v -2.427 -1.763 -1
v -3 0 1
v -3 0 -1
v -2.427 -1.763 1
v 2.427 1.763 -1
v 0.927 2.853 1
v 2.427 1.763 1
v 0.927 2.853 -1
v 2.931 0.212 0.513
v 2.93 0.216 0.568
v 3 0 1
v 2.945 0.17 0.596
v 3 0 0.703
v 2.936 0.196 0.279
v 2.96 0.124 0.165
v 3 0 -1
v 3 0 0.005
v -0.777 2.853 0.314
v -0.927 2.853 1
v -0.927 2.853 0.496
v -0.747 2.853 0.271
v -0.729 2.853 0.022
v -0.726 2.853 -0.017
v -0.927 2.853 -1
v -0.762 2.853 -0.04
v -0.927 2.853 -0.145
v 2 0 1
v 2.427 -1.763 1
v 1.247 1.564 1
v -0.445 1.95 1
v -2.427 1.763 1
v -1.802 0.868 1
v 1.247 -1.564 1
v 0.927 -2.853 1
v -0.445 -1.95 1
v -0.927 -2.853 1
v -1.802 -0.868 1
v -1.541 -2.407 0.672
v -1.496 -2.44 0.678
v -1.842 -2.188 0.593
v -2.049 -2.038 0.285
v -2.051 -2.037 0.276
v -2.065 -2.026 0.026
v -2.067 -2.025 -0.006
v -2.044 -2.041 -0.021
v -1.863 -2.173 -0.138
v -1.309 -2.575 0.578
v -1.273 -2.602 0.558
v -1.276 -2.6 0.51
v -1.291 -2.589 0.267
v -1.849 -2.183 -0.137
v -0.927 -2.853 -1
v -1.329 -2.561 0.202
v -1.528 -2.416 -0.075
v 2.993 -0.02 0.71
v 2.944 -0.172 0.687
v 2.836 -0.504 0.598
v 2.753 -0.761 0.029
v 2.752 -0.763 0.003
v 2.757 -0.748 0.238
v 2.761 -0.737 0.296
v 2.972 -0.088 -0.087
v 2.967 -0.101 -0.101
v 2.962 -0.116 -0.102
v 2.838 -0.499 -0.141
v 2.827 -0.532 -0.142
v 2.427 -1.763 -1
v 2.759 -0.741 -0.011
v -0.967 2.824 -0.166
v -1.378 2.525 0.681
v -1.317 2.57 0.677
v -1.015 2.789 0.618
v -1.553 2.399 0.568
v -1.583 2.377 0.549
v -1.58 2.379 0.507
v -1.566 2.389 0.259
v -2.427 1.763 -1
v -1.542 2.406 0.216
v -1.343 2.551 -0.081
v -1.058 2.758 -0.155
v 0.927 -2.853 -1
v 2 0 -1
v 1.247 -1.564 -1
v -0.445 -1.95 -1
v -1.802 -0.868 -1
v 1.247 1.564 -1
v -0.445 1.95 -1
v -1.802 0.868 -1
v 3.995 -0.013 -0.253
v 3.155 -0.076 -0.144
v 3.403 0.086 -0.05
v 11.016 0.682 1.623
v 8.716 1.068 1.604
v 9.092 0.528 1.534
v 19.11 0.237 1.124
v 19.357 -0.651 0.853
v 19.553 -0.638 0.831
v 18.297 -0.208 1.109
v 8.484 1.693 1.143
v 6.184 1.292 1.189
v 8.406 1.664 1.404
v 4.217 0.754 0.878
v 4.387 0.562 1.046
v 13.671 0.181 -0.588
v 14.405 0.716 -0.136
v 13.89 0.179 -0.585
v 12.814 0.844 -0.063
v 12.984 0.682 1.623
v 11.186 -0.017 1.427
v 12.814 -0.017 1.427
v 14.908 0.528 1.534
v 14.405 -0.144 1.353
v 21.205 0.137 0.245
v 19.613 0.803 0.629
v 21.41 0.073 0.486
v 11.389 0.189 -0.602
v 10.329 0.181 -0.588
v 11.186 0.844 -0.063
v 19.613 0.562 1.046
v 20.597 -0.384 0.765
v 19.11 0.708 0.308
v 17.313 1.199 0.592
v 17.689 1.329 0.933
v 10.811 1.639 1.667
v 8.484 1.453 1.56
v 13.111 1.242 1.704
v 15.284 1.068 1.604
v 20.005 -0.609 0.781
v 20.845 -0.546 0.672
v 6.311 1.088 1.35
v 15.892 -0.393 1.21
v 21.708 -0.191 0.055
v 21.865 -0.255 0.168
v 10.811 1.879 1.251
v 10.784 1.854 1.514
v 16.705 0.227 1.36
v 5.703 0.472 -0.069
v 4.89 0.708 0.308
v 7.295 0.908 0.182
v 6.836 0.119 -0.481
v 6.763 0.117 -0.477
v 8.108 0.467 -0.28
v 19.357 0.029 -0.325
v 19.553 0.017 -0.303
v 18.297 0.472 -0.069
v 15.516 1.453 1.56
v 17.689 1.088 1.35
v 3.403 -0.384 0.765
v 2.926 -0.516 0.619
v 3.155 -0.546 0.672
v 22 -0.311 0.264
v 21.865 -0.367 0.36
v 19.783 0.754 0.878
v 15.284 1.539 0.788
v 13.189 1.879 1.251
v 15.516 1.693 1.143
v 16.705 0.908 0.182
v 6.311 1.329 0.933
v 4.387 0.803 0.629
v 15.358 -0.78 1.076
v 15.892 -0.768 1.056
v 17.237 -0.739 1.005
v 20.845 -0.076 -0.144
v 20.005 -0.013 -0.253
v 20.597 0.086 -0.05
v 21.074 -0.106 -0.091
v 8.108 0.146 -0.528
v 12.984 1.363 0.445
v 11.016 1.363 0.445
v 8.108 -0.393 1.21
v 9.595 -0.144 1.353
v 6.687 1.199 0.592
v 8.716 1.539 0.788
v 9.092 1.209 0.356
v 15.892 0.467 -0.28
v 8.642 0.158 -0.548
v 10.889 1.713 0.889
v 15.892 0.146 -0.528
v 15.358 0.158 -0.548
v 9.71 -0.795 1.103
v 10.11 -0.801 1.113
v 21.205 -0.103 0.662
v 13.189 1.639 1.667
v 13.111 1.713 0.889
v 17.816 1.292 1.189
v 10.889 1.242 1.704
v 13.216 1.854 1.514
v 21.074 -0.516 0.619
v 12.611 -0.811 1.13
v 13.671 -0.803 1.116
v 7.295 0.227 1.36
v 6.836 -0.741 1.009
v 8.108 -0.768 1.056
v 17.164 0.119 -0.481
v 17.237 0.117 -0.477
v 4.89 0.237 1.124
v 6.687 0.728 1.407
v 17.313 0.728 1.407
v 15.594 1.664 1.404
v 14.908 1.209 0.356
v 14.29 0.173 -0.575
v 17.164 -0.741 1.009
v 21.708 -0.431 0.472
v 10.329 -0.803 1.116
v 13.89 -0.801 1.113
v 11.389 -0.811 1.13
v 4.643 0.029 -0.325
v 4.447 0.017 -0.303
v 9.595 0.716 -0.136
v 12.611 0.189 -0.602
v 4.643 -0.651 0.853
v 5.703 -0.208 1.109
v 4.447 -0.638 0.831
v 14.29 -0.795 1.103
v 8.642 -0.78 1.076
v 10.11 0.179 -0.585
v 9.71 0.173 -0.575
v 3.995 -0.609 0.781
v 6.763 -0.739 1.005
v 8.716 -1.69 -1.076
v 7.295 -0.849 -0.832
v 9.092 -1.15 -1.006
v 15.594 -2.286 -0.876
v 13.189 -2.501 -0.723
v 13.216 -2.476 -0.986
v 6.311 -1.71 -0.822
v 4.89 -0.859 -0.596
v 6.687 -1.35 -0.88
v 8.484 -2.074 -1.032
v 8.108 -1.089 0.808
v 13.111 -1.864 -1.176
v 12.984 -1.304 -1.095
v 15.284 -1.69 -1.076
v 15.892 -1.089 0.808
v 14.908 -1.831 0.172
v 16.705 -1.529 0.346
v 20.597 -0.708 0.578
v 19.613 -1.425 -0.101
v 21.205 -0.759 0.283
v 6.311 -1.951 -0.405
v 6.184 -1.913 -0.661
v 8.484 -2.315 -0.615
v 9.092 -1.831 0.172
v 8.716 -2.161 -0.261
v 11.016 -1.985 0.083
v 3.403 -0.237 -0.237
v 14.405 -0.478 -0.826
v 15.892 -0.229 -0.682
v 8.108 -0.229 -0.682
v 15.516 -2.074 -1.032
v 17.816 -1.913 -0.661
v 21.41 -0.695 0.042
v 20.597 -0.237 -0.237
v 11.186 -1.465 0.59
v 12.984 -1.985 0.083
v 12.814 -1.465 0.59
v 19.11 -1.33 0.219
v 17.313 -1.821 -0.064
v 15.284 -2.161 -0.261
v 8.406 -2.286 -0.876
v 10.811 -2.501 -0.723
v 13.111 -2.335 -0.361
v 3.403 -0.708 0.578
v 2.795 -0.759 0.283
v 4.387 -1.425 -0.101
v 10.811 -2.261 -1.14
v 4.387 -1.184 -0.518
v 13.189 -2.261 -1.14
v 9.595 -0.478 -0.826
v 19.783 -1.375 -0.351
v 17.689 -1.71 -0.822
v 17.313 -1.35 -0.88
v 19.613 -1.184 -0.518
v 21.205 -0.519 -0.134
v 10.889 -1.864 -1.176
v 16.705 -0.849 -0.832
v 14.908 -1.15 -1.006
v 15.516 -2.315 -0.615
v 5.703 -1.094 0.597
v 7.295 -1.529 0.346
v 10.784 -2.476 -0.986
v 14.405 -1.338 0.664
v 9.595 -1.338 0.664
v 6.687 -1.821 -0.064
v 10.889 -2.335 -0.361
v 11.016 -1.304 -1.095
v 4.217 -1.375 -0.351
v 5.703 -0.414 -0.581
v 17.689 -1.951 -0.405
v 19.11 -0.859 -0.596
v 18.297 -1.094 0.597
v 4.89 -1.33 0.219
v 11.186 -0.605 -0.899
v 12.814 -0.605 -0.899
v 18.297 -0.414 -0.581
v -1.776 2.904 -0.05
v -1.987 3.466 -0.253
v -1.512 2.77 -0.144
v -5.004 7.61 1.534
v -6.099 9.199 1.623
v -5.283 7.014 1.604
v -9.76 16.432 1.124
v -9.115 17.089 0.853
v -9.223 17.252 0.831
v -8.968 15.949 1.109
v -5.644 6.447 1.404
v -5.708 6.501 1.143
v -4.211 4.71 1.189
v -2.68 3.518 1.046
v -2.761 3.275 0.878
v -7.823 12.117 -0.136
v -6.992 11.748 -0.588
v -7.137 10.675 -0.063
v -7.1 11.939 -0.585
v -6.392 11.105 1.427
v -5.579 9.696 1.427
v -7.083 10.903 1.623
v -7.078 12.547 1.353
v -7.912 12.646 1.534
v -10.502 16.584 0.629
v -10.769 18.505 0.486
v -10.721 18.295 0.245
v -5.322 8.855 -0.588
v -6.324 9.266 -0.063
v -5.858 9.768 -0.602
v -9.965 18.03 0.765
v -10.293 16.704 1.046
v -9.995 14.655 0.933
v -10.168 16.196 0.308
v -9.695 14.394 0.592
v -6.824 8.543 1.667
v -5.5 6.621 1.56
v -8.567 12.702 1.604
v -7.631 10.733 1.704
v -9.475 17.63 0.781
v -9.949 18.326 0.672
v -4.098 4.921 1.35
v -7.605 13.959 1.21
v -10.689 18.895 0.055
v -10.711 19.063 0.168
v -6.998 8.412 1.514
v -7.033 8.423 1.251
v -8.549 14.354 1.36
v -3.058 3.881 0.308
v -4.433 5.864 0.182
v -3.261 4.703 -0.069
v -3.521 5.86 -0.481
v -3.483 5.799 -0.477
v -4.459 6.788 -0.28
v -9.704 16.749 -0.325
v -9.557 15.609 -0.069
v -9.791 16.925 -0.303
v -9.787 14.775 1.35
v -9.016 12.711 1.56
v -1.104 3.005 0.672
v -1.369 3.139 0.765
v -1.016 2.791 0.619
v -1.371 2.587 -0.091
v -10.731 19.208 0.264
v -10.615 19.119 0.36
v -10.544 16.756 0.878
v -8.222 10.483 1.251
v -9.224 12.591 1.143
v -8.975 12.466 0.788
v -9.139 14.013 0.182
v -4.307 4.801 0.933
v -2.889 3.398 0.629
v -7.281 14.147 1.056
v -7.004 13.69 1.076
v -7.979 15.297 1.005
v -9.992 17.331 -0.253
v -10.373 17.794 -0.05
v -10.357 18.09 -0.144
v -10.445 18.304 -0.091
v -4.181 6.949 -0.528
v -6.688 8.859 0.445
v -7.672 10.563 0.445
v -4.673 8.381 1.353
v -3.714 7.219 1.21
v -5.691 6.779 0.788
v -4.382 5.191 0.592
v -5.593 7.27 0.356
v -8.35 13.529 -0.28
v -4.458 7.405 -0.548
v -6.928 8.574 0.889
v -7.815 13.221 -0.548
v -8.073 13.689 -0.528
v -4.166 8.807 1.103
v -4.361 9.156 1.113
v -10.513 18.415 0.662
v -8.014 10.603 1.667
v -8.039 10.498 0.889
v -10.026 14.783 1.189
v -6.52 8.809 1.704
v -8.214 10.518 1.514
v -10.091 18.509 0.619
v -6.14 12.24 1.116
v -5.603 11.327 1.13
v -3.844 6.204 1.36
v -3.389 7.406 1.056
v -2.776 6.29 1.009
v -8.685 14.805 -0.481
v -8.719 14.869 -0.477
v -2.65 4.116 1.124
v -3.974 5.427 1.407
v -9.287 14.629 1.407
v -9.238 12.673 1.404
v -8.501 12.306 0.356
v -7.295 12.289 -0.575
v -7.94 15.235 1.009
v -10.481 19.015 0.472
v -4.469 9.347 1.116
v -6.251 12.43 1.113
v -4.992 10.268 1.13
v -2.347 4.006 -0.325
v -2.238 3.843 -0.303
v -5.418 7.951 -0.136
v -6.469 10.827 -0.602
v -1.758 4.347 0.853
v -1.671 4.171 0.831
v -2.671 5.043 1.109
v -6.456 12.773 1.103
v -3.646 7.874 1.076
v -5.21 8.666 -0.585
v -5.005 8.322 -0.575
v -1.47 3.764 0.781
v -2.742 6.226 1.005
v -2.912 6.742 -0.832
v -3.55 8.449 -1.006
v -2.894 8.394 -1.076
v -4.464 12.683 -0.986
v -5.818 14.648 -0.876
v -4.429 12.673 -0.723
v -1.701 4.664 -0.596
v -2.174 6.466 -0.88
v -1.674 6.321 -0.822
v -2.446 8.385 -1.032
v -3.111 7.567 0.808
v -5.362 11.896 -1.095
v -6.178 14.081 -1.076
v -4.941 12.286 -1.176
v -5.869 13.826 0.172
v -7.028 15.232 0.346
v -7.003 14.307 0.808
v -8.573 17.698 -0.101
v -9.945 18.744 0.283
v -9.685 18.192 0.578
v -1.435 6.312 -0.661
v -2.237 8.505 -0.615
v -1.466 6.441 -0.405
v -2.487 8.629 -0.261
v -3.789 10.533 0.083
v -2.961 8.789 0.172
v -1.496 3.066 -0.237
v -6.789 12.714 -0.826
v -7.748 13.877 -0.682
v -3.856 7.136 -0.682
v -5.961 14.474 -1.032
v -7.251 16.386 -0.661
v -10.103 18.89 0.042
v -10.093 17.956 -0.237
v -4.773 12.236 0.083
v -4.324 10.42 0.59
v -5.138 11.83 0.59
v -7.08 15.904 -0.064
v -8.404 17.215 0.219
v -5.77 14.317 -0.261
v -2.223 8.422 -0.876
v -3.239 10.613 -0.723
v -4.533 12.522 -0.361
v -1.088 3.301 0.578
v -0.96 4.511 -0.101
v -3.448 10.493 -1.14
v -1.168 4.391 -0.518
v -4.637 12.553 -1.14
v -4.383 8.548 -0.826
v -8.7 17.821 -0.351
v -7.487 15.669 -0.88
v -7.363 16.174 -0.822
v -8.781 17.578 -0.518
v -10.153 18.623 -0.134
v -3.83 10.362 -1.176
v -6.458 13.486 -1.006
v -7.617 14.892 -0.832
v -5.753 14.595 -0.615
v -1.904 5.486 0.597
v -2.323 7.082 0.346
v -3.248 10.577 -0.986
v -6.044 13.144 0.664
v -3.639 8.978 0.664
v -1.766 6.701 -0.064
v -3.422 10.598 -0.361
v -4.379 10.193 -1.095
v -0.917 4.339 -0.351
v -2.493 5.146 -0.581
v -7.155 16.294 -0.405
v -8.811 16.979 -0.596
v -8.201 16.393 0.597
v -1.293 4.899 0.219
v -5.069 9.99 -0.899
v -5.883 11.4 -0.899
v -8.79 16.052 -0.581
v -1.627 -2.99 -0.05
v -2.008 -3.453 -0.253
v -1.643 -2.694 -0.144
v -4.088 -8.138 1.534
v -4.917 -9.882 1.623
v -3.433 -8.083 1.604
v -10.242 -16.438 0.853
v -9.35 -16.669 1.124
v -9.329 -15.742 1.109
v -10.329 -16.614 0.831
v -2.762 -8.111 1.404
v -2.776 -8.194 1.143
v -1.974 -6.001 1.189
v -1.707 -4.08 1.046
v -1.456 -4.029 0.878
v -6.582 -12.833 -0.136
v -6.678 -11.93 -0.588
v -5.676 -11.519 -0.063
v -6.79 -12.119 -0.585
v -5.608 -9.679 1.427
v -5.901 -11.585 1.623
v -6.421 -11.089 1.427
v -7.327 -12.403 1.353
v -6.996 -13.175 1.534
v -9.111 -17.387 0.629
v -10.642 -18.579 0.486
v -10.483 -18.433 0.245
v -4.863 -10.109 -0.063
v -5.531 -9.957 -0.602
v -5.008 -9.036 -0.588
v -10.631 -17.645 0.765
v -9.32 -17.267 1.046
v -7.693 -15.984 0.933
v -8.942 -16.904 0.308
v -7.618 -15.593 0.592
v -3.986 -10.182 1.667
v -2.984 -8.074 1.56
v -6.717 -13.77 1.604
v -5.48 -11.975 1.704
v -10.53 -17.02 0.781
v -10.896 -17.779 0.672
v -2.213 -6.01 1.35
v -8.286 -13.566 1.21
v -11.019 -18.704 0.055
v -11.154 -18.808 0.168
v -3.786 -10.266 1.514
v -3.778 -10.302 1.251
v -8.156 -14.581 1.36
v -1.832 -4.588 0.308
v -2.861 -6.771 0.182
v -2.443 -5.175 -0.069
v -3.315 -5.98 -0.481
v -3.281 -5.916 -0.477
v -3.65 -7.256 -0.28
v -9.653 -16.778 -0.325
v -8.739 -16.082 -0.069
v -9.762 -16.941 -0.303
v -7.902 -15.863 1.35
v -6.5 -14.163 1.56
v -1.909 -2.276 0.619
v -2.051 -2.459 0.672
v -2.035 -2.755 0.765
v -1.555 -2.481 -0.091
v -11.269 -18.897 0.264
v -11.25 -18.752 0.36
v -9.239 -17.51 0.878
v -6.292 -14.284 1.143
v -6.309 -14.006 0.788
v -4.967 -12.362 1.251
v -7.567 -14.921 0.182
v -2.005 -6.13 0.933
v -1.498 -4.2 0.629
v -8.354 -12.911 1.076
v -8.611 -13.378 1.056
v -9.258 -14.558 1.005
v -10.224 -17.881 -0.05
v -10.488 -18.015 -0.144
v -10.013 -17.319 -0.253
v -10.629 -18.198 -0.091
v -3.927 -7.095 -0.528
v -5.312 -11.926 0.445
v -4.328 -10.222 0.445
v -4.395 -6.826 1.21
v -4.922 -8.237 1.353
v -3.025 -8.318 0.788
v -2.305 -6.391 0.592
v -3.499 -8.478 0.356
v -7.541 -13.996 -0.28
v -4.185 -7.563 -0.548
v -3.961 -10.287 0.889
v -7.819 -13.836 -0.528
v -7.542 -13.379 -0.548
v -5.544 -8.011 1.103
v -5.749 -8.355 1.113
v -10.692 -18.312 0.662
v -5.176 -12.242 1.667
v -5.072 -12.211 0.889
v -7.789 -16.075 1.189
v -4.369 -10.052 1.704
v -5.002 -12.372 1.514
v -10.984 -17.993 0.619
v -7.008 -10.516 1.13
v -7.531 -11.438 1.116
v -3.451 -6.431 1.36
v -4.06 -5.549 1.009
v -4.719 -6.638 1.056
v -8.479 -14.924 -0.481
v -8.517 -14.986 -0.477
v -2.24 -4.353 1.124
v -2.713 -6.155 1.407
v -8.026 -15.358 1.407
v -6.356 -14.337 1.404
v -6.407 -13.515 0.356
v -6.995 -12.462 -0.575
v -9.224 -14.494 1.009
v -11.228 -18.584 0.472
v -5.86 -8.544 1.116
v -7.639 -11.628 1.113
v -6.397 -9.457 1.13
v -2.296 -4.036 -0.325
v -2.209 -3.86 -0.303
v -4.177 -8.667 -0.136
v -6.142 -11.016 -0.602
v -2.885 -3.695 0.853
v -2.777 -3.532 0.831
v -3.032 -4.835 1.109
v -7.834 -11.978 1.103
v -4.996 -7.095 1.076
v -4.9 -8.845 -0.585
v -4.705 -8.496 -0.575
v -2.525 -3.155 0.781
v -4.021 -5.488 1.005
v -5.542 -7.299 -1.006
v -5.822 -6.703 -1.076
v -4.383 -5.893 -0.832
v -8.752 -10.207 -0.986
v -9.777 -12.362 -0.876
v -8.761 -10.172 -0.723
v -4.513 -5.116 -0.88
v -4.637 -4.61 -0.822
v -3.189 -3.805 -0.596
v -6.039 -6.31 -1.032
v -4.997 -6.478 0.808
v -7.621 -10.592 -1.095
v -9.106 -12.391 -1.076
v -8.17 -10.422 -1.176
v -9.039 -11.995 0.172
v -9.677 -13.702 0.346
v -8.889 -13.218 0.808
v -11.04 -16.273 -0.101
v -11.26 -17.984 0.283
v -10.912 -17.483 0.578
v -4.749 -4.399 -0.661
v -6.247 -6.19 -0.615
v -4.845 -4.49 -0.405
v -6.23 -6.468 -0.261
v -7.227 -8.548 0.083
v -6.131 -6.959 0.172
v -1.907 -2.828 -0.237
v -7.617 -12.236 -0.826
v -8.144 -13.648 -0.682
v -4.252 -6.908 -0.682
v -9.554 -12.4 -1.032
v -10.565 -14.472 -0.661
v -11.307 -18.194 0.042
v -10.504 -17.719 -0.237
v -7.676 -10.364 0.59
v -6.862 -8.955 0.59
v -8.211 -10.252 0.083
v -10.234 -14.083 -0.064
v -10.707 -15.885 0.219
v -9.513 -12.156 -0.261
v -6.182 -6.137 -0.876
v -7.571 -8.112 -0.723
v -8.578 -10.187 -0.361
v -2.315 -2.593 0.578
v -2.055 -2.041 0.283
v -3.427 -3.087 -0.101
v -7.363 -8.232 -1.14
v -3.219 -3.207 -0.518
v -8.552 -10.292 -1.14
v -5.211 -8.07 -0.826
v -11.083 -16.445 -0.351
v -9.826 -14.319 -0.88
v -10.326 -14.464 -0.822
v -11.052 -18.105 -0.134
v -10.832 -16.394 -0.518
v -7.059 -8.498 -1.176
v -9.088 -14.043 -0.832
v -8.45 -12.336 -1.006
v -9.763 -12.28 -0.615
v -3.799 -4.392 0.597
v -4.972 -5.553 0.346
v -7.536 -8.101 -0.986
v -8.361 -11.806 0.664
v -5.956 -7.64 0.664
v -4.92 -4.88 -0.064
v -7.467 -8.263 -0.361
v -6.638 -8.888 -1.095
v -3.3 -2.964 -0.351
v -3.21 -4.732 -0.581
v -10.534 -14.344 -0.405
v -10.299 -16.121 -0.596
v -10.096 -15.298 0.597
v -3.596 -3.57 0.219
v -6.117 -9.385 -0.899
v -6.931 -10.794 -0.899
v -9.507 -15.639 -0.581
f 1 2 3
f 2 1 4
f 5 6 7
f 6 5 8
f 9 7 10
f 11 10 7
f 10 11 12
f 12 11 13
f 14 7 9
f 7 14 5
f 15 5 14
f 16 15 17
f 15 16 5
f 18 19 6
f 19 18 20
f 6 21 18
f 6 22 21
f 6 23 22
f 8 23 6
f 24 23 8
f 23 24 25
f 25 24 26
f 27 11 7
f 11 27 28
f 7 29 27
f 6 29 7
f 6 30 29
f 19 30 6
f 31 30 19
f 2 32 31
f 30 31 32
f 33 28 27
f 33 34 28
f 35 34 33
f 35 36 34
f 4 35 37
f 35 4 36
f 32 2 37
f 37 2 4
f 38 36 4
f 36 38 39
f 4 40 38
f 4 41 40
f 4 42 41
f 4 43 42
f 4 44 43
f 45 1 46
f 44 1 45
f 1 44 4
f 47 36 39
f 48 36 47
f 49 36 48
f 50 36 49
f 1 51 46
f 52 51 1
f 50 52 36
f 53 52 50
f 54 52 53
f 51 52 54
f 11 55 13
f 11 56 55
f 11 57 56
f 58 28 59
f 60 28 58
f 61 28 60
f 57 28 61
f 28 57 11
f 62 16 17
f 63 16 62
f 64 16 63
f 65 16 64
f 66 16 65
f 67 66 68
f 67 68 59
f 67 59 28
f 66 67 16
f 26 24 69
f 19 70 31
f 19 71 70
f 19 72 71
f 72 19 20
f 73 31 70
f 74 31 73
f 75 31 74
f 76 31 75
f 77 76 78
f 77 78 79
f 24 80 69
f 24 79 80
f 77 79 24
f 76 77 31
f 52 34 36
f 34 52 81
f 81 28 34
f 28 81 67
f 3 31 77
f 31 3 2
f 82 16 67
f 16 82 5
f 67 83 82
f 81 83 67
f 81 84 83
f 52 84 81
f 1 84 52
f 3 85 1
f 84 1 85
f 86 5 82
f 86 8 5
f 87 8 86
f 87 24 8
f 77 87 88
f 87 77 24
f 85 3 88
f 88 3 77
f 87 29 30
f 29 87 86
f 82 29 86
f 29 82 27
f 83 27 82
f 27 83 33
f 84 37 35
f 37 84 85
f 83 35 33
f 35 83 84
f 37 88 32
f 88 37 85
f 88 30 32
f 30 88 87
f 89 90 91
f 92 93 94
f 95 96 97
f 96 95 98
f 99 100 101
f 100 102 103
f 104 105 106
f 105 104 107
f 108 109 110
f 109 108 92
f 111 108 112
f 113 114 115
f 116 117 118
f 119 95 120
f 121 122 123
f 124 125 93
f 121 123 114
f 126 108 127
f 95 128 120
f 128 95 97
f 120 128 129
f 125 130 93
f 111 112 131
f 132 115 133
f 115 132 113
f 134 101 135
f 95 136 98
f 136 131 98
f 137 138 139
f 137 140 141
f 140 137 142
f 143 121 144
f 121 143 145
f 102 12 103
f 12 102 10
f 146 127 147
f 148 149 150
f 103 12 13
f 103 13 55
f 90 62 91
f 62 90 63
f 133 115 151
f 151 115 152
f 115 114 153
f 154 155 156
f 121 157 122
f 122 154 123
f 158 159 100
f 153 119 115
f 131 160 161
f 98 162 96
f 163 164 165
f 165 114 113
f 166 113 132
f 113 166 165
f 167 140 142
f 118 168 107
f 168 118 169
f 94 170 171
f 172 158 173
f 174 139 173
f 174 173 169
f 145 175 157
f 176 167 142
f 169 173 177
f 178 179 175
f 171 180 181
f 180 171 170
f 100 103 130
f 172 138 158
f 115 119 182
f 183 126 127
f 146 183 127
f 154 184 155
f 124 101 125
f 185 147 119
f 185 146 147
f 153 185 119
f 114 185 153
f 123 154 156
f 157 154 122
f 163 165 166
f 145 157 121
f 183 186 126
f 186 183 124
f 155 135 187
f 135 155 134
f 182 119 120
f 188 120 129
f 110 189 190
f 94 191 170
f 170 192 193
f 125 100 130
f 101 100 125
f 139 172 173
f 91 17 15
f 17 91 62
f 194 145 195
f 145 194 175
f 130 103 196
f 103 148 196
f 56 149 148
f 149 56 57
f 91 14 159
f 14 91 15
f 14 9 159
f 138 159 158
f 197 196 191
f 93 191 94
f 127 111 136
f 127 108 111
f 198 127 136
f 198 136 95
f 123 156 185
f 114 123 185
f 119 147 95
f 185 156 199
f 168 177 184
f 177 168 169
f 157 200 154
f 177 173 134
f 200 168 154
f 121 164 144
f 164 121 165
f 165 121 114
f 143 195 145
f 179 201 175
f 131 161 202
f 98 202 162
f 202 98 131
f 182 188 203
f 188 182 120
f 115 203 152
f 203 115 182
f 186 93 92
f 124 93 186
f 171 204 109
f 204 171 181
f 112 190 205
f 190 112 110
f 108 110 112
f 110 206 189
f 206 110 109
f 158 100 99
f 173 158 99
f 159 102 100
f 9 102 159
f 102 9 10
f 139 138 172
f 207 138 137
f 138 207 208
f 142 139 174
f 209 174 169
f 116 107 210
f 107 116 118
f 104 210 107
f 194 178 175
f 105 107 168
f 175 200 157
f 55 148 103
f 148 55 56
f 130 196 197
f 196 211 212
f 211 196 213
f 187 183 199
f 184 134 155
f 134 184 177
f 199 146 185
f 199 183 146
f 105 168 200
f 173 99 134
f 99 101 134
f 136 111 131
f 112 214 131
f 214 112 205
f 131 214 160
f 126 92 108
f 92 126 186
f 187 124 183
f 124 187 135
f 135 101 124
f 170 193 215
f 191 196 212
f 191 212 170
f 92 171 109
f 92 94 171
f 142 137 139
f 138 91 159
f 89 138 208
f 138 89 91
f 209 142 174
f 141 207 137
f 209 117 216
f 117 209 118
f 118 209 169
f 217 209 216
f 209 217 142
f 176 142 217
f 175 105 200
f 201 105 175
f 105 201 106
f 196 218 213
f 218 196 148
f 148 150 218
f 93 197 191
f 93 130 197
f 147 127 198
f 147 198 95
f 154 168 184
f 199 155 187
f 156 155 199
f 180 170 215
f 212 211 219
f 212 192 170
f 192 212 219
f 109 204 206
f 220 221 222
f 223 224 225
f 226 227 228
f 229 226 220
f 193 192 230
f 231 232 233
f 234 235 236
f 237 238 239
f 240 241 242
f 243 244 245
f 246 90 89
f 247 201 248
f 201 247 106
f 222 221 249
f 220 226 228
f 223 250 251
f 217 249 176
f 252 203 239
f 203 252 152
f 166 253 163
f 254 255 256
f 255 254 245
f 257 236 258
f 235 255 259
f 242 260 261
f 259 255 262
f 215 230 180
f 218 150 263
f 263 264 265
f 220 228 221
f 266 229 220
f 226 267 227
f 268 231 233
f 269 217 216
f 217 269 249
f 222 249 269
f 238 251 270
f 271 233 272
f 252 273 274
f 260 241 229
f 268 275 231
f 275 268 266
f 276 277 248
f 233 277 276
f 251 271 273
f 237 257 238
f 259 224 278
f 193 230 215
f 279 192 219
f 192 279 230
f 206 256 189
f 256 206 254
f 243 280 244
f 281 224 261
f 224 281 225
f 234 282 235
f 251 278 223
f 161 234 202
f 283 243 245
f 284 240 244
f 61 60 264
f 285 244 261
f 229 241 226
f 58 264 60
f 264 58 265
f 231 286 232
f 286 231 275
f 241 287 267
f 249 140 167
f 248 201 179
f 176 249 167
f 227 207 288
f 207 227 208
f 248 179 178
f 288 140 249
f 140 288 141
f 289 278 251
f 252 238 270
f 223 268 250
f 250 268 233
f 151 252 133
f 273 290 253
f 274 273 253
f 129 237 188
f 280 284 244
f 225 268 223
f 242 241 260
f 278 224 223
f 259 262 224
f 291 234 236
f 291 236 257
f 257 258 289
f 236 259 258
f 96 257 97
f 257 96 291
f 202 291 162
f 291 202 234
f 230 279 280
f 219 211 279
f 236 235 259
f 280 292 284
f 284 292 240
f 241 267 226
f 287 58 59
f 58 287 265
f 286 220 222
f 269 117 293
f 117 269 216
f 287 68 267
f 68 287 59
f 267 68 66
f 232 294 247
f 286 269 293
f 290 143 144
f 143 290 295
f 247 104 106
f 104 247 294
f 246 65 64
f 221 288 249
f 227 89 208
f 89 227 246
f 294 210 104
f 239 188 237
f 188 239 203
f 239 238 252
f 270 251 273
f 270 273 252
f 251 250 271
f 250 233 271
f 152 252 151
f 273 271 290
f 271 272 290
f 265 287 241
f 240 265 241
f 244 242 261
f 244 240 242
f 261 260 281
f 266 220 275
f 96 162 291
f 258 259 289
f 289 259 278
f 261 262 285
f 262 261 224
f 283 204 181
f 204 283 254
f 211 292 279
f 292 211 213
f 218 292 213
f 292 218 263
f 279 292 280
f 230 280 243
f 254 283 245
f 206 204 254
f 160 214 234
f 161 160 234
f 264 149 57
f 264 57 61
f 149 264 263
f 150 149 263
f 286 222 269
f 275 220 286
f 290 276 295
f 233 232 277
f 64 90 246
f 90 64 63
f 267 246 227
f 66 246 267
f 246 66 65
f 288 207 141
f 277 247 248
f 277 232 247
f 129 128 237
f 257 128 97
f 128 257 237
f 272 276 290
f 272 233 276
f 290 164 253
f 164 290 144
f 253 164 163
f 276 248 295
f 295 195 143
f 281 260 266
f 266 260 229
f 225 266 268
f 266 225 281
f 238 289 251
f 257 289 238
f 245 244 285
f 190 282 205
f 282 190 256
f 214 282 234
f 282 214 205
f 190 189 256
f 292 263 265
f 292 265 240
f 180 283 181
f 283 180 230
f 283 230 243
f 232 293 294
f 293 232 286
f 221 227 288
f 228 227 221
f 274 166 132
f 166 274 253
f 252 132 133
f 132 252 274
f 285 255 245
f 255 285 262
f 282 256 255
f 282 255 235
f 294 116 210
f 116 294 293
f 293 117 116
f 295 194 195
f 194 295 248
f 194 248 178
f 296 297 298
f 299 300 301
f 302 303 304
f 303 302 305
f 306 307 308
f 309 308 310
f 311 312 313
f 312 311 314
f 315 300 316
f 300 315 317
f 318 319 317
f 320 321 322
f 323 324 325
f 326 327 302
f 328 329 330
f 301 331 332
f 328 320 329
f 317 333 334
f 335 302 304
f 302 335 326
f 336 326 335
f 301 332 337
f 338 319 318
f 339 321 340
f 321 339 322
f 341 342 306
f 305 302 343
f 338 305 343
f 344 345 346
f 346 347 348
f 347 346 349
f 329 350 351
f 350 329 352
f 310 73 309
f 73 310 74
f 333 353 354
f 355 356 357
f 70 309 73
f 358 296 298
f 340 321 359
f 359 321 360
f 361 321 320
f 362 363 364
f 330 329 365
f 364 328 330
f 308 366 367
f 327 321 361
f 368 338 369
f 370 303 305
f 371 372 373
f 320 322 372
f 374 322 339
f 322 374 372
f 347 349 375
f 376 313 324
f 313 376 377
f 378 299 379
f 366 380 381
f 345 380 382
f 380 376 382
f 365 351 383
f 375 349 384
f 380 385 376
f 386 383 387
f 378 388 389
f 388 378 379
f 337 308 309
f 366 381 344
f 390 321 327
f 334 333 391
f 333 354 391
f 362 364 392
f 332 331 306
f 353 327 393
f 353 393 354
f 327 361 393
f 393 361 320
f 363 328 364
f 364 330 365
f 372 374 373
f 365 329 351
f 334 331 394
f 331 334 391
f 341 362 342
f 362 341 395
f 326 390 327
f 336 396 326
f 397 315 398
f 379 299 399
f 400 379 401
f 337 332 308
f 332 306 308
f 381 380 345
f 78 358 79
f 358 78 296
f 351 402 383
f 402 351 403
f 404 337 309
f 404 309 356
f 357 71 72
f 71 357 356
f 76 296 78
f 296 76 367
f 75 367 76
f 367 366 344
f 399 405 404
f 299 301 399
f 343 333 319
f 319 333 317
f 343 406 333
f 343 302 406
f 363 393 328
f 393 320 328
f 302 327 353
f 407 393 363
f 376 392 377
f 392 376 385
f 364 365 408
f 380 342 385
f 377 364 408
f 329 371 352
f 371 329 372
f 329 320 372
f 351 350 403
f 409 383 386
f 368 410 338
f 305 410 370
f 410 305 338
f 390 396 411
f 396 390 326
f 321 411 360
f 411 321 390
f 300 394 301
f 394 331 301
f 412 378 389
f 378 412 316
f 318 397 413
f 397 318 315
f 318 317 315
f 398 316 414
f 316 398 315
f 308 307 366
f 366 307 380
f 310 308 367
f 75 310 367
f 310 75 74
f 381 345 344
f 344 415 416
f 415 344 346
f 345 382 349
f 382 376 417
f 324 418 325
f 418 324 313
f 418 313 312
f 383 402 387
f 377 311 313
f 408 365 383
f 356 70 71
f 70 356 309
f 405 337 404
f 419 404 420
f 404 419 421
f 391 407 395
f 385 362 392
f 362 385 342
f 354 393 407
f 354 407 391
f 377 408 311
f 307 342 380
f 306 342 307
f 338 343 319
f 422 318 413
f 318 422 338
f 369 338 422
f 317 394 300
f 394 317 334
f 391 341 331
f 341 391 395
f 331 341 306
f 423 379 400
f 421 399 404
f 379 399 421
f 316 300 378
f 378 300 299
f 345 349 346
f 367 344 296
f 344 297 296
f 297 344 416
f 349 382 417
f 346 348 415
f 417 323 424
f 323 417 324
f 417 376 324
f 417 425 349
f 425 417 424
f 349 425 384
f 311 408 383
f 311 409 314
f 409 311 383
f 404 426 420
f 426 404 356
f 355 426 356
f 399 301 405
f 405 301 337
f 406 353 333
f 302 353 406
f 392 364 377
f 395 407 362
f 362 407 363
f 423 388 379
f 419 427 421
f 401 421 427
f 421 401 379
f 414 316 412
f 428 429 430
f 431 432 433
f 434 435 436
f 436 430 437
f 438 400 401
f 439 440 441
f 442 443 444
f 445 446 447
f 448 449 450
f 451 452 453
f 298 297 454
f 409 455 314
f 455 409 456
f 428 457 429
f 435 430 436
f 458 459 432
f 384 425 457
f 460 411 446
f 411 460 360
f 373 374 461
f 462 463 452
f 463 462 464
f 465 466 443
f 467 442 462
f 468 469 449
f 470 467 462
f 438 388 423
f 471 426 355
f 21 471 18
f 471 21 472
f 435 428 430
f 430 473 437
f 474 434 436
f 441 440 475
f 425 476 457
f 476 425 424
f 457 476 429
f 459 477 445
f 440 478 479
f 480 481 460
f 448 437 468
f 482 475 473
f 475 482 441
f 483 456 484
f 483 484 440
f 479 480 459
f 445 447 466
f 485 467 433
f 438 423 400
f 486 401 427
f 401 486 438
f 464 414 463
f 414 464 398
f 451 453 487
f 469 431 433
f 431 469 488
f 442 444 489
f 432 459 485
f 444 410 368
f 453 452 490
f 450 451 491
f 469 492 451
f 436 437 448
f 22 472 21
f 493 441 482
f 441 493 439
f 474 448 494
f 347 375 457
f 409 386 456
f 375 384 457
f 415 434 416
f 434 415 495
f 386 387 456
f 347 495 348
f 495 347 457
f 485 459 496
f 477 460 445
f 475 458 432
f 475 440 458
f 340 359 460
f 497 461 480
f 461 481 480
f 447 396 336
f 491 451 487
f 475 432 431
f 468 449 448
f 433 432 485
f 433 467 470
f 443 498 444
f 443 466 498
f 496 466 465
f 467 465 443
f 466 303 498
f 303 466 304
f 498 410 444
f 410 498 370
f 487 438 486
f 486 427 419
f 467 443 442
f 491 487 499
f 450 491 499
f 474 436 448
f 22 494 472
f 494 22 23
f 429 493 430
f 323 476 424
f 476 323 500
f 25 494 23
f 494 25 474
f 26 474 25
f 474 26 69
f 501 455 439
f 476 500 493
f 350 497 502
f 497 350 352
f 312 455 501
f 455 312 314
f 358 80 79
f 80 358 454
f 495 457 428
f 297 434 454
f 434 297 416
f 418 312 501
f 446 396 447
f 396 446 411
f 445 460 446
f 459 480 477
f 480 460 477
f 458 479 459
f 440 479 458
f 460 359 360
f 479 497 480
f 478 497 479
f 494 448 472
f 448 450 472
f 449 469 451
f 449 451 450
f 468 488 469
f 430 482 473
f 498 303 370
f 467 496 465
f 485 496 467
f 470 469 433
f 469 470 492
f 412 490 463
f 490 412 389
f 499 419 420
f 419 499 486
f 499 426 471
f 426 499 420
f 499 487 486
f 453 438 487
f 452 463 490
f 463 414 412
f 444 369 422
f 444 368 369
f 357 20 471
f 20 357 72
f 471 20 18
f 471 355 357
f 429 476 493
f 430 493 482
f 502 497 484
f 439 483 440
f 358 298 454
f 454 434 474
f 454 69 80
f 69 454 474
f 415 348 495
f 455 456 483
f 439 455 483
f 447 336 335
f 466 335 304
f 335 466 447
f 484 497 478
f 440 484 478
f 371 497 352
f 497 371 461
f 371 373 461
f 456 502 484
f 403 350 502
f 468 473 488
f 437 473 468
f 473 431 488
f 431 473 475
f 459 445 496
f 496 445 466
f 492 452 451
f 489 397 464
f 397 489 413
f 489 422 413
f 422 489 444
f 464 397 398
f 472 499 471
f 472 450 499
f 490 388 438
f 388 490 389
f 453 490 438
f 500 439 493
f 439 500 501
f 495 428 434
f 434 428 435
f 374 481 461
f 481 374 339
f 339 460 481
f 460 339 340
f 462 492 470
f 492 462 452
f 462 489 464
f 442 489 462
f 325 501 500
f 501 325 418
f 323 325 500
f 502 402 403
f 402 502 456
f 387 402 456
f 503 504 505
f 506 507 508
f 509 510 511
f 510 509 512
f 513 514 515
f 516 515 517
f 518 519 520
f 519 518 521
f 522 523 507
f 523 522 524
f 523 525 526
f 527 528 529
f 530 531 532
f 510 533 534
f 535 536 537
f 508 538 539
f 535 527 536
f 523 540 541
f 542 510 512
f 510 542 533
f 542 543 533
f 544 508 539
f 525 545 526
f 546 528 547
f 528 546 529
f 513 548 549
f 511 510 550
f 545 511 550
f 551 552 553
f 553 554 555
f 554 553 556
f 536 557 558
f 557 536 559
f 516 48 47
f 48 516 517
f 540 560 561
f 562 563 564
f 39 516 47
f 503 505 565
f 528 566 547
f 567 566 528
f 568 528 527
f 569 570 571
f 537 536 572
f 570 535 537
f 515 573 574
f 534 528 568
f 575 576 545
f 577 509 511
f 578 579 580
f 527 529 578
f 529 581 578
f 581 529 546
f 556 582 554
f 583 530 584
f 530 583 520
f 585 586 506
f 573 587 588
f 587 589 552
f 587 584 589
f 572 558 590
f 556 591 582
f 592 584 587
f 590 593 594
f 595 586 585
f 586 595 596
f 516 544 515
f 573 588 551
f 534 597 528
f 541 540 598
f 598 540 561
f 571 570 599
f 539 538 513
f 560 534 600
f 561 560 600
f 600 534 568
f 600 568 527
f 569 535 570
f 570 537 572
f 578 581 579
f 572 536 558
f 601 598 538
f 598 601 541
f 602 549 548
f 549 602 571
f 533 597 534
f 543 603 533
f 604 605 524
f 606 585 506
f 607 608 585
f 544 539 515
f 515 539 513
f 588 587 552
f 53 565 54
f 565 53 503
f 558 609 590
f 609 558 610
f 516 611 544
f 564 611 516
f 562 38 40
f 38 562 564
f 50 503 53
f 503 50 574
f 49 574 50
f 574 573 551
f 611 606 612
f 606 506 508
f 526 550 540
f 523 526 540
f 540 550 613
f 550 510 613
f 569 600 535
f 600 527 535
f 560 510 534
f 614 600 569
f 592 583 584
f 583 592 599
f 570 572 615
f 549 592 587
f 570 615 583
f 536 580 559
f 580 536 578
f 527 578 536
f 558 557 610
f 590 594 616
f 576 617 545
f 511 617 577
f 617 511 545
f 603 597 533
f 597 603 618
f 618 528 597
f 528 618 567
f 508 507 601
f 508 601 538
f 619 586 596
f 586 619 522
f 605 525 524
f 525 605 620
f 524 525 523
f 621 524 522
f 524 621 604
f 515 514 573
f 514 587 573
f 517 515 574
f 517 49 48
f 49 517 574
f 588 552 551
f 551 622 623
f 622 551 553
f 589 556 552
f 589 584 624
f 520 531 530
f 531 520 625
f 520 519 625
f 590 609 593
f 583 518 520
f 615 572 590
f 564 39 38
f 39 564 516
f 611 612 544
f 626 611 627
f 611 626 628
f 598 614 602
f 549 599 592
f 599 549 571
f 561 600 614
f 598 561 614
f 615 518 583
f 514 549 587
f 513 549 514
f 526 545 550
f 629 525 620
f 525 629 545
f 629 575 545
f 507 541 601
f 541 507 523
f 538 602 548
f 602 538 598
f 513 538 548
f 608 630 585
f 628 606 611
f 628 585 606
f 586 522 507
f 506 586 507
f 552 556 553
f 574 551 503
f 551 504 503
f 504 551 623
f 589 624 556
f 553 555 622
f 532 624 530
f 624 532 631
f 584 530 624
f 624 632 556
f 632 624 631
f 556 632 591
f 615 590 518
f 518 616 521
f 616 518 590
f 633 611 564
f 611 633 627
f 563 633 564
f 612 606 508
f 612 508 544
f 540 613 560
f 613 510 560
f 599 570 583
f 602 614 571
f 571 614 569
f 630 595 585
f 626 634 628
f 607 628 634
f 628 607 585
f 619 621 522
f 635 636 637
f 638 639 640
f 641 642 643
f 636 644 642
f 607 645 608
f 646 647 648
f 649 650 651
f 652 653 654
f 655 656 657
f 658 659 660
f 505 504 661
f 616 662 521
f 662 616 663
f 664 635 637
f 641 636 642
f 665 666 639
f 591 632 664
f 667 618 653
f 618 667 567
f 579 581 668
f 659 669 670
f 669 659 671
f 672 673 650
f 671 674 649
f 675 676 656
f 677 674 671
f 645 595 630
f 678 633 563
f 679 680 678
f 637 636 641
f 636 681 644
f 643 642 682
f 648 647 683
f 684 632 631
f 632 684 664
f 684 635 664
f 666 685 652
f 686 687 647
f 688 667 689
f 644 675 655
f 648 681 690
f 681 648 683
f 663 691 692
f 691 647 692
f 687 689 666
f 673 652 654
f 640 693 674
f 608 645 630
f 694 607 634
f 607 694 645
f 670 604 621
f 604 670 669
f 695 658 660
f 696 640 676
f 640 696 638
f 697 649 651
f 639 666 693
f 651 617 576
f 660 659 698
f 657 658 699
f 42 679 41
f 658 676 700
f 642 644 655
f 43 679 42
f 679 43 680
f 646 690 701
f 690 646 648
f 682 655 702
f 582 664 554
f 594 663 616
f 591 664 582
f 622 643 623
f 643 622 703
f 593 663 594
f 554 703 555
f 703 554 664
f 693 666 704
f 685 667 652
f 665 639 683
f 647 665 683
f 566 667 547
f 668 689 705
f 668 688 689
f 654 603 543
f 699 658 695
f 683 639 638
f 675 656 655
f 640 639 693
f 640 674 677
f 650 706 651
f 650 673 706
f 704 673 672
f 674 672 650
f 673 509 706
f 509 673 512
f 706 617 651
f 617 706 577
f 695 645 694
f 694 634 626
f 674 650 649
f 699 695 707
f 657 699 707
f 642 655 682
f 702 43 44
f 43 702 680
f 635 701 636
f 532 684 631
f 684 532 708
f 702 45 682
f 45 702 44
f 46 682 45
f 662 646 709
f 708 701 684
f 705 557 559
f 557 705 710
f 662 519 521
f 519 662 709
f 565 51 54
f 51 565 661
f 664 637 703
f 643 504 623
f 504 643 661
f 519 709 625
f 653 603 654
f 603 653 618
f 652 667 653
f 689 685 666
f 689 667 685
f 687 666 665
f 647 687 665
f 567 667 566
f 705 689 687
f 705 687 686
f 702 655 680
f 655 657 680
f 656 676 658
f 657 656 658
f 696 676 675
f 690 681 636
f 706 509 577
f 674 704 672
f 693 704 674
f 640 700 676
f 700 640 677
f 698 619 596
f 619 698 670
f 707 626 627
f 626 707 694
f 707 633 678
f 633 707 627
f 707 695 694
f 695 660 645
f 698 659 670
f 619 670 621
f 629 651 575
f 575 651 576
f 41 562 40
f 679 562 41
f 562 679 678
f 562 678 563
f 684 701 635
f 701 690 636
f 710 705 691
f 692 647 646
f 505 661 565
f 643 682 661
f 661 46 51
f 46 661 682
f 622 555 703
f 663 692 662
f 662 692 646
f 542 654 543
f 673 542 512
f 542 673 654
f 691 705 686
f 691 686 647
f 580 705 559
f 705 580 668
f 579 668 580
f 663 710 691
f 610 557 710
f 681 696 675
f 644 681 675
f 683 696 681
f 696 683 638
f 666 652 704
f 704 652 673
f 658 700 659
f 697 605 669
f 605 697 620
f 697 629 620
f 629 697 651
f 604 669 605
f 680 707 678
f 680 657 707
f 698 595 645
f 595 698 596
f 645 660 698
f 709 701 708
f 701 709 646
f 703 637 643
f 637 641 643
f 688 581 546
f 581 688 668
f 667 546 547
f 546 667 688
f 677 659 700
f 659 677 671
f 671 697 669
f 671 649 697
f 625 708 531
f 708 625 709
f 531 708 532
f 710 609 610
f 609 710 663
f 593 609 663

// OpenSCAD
module pBlade(){
    translate([0,-2.5,-1])
    rotate([30,0,0])
    resize([20,5,2])
        intersection(){
            sphere(10);
            translate([0,10,0])
                sphere(10);
}
}

module propellor(){
    difference(){
        cylinder(h=2, r=3, center = true);
        cylinder(h=2.001, r=2, center = true);
    }  

    for(rz=[0:120:240]){
        rotate([0,0,rz])
        translate([12,0,0])
            pBlade();
    }
}

color("black"){
    propellor();
}
